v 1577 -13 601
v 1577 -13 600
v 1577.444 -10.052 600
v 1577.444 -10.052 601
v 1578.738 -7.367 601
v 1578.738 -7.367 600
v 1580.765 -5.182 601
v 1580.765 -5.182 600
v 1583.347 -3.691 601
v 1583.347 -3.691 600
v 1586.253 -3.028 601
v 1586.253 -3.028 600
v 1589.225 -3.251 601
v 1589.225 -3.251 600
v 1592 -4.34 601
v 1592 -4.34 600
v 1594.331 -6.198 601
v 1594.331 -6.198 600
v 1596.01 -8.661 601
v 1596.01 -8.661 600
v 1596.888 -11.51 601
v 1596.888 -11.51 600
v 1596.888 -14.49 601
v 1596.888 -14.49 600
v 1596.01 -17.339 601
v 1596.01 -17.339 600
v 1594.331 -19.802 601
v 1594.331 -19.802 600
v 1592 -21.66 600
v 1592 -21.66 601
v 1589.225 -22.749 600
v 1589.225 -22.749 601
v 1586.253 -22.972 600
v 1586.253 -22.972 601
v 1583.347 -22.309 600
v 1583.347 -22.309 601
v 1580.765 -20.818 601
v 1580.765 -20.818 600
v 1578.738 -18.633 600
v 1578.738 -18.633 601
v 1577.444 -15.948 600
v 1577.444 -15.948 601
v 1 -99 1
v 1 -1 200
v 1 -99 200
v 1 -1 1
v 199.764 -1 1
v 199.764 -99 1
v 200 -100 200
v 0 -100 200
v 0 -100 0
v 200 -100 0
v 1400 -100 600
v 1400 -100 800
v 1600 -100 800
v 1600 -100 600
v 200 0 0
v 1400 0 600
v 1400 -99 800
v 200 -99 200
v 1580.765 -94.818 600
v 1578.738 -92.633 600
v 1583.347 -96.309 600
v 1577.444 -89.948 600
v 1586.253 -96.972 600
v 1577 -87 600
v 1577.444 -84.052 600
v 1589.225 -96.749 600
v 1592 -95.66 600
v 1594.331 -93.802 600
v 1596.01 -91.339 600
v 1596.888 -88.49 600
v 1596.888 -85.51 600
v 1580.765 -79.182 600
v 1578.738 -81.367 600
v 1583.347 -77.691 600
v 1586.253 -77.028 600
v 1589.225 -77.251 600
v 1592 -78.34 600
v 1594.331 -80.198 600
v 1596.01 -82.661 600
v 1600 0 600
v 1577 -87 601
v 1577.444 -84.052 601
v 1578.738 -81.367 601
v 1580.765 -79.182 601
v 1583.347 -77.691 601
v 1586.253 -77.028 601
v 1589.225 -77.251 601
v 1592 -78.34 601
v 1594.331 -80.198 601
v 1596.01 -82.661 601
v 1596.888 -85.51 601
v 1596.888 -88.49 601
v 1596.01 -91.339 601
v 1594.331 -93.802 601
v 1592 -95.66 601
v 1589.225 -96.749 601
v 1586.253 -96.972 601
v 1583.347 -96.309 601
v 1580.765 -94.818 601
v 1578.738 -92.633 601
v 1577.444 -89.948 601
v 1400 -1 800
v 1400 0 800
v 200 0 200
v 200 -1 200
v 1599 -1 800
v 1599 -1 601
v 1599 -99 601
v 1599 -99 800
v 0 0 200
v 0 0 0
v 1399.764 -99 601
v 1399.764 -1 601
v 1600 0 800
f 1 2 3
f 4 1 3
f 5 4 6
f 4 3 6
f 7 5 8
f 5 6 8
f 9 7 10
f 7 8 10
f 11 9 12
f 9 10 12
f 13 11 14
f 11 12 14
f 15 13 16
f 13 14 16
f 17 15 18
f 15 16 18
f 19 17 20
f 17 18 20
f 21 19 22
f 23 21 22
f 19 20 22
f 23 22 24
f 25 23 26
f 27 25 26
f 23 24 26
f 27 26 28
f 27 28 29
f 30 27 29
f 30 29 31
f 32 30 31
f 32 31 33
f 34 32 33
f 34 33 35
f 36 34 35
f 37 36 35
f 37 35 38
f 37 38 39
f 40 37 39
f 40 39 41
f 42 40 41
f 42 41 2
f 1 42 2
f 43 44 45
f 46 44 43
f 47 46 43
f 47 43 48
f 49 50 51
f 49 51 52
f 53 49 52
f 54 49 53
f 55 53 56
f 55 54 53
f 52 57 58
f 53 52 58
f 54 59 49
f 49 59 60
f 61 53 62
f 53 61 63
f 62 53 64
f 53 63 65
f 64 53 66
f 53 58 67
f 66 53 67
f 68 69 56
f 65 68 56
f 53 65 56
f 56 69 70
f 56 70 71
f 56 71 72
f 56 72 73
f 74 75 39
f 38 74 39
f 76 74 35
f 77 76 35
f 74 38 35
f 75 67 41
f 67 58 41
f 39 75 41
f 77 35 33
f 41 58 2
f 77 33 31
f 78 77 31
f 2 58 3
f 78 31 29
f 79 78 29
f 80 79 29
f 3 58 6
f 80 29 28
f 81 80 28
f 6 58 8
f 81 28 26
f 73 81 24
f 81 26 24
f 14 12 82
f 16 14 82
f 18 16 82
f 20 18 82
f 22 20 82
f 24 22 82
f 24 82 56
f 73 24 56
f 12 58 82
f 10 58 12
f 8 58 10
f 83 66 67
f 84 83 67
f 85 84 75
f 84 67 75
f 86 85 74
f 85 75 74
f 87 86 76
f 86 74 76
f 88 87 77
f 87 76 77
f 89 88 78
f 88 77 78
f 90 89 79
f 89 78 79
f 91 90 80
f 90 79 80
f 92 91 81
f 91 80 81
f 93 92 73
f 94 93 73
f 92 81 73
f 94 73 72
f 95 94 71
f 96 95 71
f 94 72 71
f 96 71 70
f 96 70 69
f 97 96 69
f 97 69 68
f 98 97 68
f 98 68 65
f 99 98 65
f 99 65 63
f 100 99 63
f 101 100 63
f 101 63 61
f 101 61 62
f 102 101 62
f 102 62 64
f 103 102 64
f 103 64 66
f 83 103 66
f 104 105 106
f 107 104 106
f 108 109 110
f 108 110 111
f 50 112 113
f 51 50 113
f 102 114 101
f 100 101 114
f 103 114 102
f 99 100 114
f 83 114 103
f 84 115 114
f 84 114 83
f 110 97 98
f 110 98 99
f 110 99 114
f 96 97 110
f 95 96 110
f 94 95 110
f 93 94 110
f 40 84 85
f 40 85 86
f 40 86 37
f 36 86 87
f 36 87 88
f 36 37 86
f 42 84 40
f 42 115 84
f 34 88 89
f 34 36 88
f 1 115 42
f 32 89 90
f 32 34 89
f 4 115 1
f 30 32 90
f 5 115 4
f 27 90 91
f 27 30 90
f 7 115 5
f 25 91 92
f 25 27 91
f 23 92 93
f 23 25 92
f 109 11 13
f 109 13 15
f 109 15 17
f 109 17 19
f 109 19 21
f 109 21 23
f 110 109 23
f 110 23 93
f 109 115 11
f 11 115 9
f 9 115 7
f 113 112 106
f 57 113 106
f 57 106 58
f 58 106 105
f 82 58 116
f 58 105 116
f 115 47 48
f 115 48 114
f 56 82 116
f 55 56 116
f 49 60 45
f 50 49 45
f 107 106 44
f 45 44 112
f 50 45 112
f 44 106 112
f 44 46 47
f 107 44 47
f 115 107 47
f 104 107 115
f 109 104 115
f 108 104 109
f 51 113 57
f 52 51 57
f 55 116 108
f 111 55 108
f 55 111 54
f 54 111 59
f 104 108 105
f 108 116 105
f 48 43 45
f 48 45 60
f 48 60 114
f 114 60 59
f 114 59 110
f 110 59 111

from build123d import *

# Parameters (mm, degrees)
F1_DEPTH = 100
F2_T     = -1
F5_D     = 20


# Not quite as in the source:
# - the program builds the solid bodies; features that only make, move or delete a surface that nothing else refers to are left out


with BuildPart() as f1:
    # F0 (on Front) → F1 (new body)
    with BuildSketch(Plane.XZ):
        Polygon((0, 200), (0, 0), (200, 0), (1400, 600), (1600, 600), (1600, 800), (1400, 800), (200, 200), align=None)
    extrude(amount=F1_DEPTH)

    # F2
    f2_openings = [f1.faces().sort_by_distance(p)[0] for p in [
        (100, -50, 200),
        (1500, -50, 800),
        (800, -50, 500),
    ]]
    offset(amount=F2_T, openings=f2_openings, kind=Kind.INTERSECTION)

    # F5 (through all)
    with Locations(Plane.XY.offset(601)):
        with Locations((1587, -13), (1587, -87)):
            Hole(F5_D / 2)


solid = f1.part
